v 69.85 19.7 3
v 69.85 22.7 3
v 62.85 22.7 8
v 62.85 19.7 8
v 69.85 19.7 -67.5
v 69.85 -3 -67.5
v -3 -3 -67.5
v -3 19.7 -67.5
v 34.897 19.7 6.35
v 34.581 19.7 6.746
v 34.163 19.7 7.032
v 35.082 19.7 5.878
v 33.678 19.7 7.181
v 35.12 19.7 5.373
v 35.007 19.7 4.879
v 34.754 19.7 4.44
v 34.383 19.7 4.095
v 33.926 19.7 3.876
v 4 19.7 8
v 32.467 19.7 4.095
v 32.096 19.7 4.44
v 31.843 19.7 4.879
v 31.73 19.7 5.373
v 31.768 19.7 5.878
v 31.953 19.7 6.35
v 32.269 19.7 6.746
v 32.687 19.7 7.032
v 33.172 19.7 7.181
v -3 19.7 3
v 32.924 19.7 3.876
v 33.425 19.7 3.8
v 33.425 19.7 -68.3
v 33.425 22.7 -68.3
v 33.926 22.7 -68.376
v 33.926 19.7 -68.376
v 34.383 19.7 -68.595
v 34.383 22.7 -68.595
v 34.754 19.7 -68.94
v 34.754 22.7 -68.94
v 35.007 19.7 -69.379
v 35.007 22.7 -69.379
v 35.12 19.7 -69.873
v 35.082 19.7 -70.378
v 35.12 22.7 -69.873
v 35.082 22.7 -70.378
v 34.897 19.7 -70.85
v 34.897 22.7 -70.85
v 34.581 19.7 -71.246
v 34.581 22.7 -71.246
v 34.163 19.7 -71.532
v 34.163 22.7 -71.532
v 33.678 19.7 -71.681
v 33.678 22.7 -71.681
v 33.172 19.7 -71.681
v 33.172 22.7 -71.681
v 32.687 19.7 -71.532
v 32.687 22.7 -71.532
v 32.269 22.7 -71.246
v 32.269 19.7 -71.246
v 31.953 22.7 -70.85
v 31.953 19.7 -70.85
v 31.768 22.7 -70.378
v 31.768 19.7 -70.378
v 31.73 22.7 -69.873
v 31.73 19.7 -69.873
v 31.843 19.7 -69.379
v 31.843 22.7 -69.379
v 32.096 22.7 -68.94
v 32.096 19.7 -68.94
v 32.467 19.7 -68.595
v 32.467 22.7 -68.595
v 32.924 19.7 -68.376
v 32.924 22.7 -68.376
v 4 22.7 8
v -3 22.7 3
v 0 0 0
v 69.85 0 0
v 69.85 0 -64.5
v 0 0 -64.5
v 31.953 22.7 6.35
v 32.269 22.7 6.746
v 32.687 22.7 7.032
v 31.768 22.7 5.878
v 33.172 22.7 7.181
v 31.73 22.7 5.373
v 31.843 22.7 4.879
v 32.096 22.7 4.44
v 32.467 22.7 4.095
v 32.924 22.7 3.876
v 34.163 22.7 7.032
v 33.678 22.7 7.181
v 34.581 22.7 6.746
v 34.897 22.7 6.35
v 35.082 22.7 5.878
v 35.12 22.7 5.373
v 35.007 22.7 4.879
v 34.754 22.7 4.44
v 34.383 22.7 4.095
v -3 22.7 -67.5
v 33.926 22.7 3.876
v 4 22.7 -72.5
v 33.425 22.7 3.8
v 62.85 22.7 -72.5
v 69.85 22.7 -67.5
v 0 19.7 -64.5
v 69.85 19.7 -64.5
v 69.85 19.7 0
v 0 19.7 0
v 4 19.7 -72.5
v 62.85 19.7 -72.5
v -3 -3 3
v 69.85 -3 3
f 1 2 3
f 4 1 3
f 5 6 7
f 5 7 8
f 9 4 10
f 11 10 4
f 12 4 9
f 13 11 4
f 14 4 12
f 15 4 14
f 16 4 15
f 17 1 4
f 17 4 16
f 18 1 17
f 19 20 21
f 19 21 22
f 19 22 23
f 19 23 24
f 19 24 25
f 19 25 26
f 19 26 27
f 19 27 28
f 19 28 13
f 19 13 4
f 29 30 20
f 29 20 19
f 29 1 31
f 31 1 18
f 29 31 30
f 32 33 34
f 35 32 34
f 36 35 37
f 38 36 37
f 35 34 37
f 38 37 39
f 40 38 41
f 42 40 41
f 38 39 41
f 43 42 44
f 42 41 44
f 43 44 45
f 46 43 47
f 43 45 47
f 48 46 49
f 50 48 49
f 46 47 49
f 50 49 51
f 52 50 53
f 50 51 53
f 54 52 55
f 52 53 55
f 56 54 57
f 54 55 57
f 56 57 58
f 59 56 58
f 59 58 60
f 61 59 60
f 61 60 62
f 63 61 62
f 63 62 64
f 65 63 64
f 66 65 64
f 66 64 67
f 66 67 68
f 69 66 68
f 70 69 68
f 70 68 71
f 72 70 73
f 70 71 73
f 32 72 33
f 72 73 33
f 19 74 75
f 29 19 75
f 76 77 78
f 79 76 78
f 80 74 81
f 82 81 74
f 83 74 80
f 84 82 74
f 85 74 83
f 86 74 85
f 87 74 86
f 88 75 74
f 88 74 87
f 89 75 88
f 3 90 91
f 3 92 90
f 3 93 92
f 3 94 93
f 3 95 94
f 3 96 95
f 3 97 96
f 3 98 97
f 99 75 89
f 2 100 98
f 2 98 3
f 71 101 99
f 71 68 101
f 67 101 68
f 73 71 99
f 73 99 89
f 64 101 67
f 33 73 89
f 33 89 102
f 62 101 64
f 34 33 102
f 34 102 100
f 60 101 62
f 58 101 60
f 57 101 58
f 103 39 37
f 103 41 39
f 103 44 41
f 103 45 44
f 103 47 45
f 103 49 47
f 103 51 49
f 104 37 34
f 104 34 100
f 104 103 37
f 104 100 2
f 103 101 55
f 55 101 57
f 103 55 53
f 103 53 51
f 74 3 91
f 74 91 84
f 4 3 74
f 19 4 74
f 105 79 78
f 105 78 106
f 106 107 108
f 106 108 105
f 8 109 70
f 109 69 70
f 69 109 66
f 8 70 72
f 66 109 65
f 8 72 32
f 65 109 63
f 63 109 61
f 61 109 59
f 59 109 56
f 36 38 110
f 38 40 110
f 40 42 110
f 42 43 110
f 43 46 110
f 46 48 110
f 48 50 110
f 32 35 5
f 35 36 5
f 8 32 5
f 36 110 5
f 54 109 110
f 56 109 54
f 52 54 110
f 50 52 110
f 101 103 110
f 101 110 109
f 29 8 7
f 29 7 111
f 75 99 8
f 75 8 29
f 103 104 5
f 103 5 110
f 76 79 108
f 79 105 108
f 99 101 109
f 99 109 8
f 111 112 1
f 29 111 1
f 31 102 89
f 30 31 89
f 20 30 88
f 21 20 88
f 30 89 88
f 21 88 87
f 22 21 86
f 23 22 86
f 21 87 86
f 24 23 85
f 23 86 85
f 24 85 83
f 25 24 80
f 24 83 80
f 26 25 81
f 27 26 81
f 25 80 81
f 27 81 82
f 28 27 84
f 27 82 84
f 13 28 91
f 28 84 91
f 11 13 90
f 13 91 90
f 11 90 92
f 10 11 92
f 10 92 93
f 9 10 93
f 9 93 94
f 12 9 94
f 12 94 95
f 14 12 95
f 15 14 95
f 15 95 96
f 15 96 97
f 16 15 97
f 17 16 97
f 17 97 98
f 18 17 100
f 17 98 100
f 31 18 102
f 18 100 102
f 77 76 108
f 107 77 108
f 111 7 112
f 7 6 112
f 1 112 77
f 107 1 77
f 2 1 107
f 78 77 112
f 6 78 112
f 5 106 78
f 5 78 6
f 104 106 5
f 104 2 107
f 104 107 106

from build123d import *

# Parameters (mm, degrees)
SKETCH2_W           = 70.5
SKETCH2_H           = 25.7
SKETCH2_W_2         = 64.5
SKETCH2_H_2         = 19.7
BOSS_EXTRUDE1_DEPTH = 69.85
SKETCH3_W           = 70.5
SKETCH3_H           = 25.7
BOSS_EXTRUDE2_DEPTH = 3
SKETCH4_R           = 1.7
BOSS_EXTRUDE3_DEPTH = 3


with BuildPart() as part:
    # Sketch2 → Boss-Extrude1 (new body)
    with BuildSketch(Plane(origin=(0, 0, 0), x_dir=(0, 0, -1), z_dir=(1, 0, 0))):
        with Locations((32.25, 9.85)):
            Rectangle(SKETCH2_W, SKETCH2_H)
        with Locations((32.25, 9.85)):
            Rectangle(SKETCH2_W_2, SKETCH2_H_2, mode=Mode.SUBTRACT)
    extrude(amount=BOSS_EXTRUDE1_DEPTH)

    # Sketch3 → Boss-Extrude2 (add)
    with BuildSketch(Plane.ZY):
        with Locations((-32.25, 9.85)):
            Rectangle(SKETCH3_W, SKETCH3_H)
    extrude(amount=BOSS_EXTRUDE2_DEPTH)

    # Sketch4 → Boss-Extrude3 (add)
    # profile 1 of 2: a face of its own
    with BuildSketch(Plane(origin=(0, 22.7, 0), x_dir=(1, 0, 0), z_dir=(0, 1, 0))):
        Polygon((69.85, 67.5), (62.85, 72.5), (4, 72.5), (-3, 67.5), align=None)
        with Locations(Location((33.425, 70, 0), (0, 0, 270))):
            Circle(SKETCH4_R, mode=Mode.SUBTRACT)
    # profile 2 of 2: a face of its own
    with BuildSketch(Plane(origin=(0, 22.7, 0), x_dir=(1, 0, 0), z_dir=(0, 1, 0))):
        Polygon((-3, -3), (69.85, -3), (62.85, -8), (4, -8), align=None)
        with Locations(Location((33.425, -5.5, 0), (0, 0, 90))):
            Circle(SKETCH4_R, mode=Mode.SUBTRACT)
    extrude(amount=-BOSS_EXTRUDE3_DEPTH)


solid = part.part
